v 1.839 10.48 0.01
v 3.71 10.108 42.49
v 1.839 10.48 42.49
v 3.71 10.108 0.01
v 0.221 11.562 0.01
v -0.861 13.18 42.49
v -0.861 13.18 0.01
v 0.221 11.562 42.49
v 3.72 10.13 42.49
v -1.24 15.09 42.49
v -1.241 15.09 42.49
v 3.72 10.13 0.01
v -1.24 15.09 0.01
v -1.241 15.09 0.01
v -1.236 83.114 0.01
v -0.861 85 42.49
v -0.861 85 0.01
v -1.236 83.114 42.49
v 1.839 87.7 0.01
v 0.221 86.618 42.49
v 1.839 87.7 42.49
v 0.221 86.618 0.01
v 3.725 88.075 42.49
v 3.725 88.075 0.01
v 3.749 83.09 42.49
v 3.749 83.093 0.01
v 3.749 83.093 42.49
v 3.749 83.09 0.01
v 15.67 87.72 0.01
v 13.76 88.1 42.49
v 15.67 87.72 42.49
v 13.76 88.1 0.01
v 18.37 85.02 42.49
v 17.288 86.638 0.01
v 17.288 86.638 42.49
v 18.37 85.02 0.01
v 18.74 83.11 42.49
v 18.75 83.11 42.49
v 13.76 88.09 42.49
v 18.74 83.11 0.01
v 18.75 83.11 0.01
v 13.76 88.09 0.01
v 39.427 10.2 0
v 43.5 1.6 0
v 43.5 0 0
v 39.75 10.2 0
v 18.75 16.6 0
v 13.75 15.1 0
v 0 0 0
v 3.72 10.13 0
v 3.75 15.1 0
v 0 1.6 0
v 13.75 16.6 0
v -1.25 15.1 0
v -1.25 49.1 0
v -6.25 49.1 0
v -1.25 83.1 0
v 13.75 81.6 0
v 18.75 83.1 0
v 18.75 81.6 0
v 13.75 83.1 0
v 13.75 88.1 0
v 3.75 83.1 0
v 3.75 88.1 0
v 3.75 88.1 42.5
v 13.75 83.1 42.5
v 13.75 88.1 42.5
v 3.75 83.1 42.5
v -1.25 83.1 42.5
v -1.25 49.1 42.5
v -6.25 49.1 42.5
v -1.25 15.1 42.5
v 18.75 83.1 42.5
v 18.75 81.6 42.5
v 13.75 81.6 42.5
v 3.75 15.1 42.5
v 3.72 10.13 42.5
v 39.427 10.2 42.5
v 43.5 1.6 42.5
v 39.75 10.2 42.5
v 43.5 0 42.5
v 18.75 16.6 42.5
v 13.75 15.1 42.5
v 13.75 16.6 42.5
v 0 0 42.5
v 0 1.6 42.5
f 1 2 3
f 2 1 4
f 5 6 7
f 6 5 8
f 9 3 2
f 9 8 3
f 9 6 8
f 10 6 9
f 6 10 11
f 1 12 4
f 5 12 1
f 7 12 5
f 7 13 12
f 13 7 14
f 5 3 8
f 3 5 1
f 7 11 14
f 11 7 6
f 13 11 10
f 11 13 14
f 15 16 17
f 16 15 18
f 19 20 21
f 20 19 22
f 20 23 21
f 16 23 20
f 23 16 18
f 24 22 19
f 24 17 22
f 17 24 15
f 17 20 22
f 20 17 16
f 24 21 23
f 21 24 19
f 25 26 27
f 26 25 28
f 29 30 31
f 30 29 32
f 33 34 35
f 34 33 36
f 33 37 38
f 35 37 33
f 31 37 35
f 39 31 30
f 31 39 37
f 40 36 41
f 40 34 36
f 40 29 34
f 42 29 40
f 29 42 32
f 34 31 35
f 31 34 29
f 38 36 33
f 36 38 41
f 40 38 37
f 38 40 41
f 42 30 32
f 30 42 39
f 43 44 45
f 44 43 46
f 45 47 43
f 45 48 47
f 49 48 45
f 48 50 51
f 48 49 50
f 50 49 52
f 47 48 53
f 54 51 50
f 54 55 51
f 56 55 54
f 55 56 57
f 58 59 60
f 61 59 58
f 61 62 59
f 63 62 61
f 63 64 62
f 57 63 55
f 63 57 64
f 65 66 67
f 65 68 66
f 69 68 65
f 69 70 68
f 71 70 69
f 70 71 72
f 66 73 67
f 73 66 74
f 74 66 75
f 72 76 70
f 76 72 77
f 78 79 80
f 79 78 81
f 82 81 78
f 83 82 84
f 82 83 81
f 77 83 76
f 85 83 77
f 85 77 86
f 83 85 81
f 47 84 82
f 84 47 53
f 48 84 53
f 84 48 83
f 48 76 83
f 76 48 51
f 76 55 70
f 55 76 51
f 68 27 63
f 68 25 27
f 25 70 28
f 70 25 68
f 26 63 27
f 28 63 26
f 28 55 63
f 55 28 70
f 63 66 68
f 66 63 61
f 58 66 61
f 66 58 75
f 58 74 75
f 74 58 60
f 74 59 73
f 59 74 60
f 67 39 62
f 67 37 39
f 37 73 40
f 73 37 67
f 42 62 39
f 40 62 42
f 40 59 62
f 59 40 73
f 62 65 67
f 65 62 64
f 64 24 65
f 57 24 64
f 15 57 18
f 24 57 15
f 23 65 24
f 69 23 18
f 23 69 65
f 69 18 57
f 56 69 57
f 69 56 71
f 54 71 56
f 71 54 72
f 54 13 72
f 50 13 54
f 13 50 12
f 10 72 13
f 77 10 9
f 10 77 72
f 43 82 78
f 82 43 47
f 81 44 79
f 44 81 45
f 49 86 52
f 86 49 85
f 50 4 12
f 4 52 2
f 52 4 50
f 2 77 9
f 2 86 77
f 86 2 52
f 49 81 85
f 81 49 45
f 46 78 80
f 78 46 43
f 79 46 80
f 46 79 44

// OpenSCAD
phone_width = 68;
phone_depth = 10;
phone_clamp_width = 44;

clamp_lip = 1.5;
spring_deflection = 5;

clamp_meat = 5;

mount_base_length = 43.5;
mount_base_height = 1.6;
mount_slant_length = 36;
mount_slant_height = 8.6;
mount_width = 42.5;

slant = (mount_base_length - mount_slant_length) / 2;
totalHeight = mount_base_height + mount_slant_height;

union() {
	translate([slant, totalHeight - 0.1, 0]) {
		clamp();
	}
	base();
}

module base() {
	linear_extrude(height = mount_width) {
		polygon([[0, 0], [0, mount_base_height], [slant, totalHeight], [slant + mount_slant_length, totalHeight], [mount_base_length, mount_base_height], [mount_base_length, 0]]);
	}
}

module clamp() {
	union() {
		linear_extrude(height = mount_width) {
			polygon([[0, 0], [-clamp_meat, clamp_meat], [-clamp_meat-spring_deflection, (phone_width / 2) + clamp_meat], [-clamp_meat, phone_width + clamp_meat], [0, phone_width + clamp_meat*2], [phone_depth + clamp_meat, phone_width + clamp_meat*2], [phone_depth, phone_width + clamp_meat*2], [phone_depth + clamp_meat, phone_width + clamp_meat], [phone_depth + clamp_meat, phone_width + clamp_meat - clamp_lip], [phone_depth, phone_width + clamp_meat - clamp_lip], [phone_depth, phone_width + clamp_meat], [0, phone_width + clamp_meat], [-spring_deflection, (phone_width / 2) + clamp_meat], [0, clamp_meat], [phone_depth, clamp_meat], [phone_depth, clamp_meat + clamp_lip], [phone_depth + clamp_meat, clamp_meat + clamp_lip], [mount_slant_length ,0]]);
		}
		translate([-0.001, clamp_meat -0.01, 0.01]) {
			rotate([0,0,0]) {
				roundedCorner(clamp_meat - 0.01, mount_width - 0.02);
			}
		}
		translate([-0.001, phone_width + clamp_meat -0.01, 0.01]) {
			rotate([0, 0, 270]) {
				roundedCorner(clamp_meat - 0.01, mount_width - 0.02);
			}
		}
		translate([phone_depth + 0.01, phone_width + clamp_meat + 0.01, 0.01]) {
			rotate([0, 0, 180]) {
				roundedCorner(clamp_meat - 0.01, mount_width - 0.02);
			}
		}
	}
}

module roundedCorner(radius, height) {
	intersection() {
		linear_extrude(height = height) {
			circle(radius);
		}
		translate([-radius, -radius,-0.01]) {
			linear_extrude(height = height + 0.02) {
				square([radius, radius], center=false);
			}
		}
	}
}
